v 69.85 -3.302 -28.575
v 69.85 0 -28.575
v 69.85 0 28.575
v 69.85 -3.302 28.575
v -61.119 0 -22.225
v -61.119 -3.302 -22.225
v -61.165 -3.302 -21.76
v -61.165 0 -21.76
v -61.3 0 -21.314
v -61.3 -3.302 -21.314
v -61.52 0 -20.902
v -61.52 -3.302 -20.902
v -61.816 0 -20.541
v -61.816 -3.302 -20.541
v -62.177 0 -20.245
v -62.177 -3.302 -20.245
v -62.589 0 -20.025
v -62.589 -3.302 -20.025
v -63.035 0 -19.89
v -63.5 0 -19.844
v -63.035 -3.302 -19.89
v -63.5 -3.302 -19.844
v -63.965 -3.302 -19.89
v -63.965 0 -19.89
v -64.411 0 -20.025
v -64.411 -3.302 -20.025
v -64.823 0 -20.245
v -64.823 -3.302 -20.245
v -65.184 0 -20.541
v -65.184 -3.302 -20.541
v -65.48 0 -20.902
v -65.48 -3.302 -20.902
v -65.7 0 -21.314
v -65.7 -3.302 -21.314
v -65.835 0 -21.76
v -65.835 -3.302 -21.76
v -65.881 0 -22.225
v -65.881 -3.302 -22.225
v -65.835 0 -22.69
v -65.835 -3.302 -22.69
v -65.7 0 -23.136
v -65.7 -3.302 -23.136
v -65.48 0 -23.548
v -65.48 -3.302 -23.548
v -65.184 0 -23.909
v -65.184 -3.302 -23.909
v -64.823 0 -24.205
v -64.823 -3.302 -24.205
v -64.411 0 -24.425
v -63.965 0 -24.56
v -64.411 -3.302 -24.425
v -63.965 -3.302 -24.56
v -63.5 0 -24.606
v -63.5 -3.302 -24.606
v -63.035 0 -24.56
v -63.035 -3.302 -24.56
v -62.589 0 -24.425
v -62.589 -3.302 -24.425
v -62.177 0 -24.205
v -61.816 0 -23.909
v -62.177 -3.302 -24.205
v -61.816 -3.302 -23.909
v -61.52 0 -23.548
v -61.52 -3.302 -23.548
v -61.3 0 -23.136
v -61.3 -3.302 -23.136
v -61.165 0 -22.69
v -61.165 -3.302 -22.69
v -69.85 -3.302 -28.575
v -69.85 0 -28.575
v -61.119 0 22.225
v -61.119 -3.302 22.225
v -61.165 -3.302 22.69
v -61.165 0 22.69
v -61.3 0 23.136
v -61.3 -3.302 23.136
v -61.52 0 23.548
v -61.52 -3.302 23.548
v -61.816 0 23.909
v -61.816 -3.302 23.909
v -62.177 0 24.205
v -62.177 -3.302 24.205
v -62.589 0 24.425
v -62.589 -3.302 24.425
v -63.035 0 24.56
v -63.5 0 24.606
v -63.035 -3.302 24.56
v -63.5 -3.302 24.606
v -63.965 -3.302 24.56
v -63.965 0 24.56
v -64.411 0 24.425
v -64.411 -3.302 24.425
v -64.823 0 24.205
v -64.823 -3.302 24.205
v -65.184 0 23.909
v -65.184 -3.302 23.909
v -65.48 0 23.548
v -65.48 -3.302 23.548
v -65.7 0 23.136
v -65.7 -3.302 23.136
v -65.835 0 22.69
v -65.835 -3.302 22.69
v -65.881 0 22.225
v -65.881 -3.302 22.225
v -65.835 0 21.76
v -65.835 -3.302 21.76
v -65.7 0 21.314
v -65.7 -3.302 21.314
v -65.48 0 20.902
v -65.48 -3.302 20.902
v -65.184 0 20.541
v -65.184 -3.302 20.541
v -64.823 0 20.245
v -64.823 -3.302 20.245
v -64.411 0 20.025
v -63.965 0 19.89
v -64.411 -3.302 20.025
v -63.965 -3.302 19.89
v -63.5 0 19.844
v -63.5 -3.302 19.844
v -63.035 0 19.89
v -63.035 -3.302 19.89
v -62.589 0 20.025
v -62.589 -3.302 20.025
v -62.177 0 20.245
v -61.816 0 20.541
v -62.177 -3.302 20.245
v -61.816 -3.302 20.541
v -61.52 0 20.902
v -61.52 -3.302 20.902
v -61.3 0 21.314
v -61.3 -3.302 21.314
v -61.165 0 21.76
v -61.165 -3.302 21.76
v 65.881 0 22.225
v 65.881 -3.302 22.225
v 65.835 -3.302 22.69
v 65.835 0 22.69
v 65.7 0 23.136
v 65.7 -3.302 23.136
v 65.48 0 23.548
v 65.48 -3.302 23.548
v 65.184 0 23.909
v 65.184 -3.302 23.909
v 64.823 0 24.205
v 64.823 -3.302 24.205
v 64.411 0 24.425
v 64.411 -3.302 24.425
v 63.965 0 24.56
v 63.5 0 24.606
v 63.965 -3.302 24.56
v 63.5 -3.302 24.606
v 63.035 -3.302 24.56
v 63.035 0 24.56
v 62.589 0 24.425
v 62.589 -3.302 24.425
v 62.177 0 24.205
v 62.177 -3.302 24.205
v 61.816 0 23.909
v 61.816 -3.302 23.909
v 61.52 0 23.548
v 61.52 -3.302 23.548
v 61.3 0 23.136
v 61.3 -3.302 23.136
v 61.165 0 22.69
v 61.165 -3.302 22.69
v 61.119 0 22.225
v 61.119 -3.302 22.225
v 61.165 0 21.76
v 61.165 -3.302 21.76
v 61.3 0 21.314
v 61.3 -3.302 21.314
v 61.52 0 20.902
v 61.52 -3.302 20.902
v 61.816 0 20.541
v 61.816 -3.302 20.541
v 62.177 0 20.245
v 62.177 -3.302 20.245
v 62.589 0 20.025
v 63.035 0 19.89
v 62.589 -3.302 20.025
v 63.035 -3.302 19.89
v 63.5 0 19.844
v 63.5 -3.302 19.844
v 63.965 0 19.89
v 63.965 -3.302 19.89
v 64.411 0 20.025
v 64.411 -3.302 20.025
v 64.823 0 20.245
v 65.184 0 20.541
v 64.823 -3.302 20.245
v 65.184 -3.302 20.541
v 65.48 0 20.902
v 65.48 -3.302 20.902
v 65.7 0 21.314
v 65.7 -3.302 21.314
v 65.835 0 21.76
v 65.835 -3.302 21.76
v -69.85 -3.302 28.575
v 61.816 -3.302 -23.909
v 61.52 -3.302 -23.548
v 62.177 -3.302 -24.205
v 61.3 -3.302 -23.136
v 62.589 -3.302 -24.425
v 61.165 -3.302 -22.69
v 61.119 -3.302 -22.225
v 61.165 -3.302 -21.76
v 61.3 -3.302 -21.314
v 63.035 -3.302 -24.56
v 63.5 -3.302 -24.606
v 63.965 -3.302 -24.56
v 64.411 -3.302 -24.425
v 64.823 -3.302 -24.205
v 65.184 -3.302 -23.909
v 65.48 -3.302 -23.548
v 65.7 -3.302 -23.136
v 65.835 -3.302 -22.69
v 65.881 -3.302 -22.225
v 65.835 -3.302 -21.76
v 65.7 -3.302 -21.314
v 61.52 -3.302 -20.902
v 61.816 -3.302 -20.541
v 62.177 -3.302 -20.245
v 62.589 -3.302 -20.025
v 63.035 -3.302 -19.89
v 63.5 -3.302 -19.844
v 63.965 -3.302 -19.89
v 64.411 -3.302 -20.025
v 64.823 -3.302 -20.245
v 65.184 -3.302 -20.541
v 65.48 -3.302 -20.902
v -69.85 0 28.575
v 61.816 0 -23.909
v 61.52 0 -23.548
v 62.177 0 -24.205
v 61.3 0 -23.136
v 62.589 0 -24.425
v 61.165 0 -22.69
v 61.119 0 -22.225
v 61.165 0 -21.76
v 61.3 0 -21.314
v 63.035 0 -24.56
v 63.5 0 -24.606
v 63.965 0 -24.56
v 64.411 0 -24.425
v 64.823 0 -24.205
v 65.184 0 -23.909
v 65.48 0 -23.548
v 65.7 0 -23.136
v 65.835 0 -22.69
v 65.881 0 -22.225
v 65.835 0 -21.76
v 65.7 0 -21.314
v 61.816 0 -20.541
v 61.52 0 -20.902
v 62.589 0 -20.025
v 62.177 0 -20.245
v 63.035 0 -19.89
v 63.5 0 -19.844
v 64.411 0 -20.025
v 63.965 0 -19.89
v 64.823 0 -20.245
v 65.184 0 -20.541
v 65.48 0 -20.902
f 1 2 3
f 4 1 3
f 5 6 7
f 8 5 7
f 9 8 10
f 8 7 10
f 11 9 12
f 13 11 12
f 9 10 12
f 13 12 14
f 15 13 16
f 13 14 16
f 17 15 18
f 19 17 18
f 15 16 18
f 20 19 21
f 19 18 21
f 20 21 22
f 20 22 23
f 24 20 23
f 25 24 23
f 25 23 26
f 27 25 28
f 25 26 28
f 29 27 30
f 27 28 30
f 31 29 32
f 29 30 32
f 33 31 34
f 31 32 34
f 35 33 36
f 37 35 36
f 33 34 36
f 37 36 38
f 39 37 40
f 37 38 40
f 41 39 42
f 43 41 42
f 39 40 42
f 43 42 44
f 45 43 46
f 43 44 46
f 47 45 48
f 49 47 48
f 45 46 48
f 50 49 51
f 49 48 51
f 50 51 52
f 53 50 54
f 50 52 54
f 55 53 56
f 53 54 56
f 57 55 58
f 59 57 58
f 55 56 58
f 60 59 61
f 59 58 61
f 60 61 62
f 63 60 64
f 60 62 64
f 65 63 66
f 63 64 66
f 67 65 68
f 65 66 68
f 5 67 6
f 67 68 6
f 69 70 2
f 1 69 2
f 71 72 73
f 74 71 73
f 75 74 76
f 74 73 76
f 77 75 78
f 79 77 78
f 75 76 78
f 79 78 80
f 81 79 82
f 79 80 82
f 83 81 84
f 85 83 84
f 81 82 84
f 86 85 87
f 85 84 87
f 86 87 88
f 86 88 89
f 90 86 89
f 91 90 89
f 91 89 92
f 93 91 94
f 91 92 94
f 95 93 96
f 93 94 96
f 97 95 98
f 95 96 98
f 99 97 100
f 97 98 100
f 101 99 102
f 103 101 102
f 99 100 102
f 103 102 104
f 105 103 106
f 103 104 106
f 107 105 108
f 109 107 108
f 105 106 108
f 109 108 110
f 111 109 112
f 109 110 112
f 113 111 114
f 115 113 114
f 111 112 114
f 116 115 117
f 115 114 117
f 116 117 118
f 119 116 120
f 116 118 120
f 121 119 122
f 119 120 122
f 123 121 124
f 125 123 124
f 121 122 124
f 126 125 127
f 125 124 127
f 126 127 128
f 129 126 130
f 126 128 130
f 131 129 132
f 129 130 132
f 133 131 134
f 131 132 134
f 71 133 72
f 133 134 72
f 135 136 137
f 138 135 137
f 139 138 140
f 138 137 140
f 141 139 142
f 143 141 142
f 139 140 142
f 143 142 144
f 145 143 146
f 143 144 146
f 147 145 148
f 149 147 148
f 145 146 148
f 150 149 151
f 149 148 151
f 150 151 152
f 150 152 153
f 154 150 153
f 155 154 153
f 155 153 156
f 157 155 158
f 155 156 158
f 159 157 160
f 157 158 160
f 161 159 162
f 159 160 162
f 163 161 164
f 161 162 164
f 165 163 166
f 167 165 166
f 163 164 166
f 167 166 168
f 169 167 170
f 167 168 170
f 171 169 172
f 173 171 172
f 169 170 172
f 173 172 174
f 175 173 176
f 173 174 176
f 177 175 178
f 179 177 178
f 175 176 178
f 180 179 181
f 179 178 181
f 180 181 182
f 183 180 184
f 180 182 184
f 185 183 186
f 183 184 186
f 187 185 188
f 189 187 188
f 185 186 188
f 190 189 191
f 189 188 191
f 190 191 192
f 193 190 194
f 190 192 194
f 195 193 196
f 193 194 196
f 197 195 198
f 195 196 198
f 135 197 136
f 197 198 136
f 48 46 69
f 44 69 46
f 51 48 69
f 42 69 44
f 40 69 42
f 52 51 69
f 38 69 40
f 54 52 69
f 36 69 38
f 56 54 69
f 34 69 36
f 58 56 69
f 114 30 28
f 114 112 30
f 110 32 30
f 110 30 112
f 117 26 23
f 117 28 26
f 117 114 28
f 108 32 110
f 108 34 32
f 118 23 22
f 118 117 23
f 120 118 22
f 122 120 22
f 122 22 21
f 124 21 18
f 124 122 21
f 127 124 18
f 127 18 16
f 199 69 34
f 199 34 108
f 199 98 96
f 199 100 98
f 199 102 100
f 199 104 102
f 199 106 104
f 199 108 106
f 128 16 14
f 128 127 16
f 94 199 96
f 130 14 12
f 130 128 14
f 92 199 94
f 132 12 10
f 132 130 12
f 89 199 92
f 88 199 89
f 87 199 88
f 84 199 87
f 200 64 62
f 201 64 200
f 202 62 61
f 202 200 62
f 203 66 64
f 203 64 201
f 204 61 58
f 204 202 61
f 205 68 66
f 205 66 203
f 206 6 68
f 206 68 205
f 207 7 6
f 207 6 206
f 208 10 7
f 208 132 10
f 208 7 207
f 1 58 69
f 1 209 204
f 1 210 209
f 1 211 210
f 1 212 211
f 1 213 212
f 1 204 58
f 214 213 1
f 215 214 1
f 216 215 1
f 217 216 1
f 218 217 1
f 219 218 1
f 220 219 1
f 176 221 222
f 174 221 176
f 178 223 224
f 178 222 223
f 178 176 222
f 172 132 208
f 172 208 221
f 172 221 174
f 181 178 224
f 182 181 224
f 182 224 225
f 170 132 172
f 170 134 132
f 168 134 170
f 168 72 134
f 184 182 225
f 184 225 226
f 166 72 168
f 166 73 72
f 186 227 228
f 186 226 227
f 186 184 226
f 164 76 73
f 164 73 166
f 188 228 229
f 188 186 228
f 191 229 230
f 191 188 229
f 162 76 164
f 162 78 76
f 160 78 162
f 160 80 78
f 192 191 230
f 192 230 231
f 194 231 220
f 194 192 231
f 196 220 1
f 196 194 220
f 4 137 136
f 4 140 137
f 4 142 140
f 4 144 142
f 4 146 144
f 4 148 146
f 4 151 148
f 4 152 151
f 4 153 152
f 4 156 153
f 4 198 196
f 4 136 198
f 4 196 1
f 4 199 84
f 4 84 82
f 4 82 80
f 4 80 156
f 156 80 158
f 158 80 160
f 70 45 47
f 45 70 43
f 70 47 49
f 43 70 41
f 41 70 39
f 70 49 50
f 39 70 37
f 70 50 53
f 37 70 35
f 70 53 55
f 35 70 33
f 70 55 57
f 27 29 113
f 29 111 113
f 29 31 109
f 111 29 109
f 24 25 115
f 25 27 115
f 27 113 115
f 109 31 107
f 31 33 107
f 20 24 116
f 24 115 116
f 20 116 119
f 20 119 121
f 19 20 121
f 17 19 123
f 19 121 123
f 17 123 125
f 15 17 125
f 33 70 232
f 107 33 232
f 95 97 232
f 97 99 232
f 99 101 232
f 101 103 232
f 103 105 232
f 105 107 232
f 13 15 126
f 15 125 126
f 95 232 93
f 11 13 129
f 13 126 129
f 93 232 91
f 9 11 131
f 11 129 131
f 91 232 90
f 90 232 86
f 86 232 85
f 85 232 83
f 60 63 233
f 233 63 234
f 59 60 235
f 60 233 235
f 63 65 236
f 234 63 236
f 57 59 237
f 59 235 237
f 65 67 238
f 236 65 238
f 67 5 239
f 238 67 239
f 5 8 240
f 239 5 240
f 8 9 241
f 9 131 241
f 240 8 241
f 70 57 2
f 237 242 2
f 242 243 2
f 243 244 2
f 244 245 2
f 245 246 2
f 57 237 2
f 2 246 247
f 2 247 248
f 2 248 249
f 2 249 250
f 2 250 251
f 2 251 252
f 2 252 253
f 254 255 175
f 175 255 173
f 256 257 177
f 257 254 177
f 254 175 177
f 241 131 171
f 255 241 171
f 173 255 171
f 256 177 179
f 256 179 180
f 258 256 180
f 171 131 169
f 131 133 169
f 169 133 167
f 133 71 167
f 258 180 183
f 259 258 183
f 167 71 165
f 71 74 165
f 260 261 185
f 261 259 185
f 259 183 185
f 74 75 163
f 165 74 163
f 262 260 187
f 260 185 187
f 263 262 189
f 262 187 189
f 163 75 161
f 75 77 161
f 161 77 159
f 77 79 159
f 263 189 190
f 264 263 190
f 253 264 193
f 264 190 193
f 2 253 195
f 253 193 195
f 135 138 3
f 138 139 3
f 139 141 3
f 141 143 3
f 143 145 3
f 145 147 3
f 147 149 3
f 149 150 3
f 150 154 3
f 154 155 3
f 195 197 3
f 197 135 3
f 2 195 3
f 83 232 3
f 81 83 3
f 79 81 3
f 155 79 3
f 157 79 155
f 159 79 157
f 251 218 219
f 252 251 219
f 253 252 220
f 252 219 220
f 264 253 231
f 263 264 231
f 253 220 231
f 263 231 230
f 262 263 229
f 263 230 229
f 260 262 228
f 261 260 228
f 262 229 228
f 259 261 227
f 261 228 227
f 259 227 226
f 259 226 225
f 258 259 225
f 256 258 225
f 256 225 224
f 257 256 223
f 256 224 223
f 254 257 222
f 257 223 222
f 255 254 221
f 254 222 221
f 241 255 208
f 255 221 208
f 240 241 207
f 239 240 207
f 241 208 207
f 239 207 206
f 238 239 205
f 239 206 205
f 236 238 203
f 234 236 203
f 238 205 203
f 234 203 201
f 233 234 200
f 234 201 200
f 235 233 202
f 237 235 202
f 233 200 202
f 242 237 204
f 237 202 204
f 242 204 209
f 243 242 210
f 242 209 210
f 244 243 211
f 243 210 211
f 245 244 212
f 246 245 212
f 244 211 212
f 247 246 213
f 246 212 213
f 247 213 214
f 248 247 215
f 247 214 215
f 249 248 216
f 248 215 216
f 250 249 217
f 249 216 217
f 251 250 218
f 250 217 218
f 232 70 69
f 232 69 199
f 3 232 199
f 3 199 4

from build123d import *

# Parameters (mm, degrees)
F0_W     = 139.7
F0_H     = 57.15
F1_DEPTH = 3.302
F2_R     = 2.38125
F4_DEPTH = 3.302
F3_R     = 2.38125
F5_DEPTH = 3.302
F6_R     = 2.38125
F7_DEPTH = 3.302
F8_R     = 2.38125
F9_DEPTH = 3.302


with BuildPart() as f1:
    # F0 (on Front) → F1 (new body)
    with BuildSketch(Plane.XZ):
        Rectangle(F0_W, F0_H)
    extrude(amount=F1_DEPTH)

    # F2 (on face) → F4 (cut)
    with BuildSketch(Plane.XZ.offset(3.302)):
        with Locations((-63.5, 22.225)):
            Circle(F2_R)
    extrude(amount=-F4_DEPTH, mode=Mode.SUBTRACT)

    # F3 (on face) → F5 (cut)
    with BuildSketch(Plane.XZ.offset(3.302)):
        with Locations((-63.5, -22.225)):
            Circle(F3_R)
    extrude(amount=-F5_DEPTH, mode=Mode.SUBTRACT)

    # F6 (on face) → F7 (cut)
    with BuildSketch(Plane.XZ.offset(3.302)):
        with Locations((63.5, 22.225)):
            Circle(F6_R)
    extrude(amount=-F7_DEPTH, mode=Mode.SUBTRACT)

    # F8 (on face) → F9 (cut)
    with BuildSketch(Plane.XZ.offset(3.302)):
        with Locations((63.5, -22.225)):
            Circle(F8_R)
    extrude(amount=-F9_DEPTH, mode=Mode.SUBTRACT)


solid = f1.part
